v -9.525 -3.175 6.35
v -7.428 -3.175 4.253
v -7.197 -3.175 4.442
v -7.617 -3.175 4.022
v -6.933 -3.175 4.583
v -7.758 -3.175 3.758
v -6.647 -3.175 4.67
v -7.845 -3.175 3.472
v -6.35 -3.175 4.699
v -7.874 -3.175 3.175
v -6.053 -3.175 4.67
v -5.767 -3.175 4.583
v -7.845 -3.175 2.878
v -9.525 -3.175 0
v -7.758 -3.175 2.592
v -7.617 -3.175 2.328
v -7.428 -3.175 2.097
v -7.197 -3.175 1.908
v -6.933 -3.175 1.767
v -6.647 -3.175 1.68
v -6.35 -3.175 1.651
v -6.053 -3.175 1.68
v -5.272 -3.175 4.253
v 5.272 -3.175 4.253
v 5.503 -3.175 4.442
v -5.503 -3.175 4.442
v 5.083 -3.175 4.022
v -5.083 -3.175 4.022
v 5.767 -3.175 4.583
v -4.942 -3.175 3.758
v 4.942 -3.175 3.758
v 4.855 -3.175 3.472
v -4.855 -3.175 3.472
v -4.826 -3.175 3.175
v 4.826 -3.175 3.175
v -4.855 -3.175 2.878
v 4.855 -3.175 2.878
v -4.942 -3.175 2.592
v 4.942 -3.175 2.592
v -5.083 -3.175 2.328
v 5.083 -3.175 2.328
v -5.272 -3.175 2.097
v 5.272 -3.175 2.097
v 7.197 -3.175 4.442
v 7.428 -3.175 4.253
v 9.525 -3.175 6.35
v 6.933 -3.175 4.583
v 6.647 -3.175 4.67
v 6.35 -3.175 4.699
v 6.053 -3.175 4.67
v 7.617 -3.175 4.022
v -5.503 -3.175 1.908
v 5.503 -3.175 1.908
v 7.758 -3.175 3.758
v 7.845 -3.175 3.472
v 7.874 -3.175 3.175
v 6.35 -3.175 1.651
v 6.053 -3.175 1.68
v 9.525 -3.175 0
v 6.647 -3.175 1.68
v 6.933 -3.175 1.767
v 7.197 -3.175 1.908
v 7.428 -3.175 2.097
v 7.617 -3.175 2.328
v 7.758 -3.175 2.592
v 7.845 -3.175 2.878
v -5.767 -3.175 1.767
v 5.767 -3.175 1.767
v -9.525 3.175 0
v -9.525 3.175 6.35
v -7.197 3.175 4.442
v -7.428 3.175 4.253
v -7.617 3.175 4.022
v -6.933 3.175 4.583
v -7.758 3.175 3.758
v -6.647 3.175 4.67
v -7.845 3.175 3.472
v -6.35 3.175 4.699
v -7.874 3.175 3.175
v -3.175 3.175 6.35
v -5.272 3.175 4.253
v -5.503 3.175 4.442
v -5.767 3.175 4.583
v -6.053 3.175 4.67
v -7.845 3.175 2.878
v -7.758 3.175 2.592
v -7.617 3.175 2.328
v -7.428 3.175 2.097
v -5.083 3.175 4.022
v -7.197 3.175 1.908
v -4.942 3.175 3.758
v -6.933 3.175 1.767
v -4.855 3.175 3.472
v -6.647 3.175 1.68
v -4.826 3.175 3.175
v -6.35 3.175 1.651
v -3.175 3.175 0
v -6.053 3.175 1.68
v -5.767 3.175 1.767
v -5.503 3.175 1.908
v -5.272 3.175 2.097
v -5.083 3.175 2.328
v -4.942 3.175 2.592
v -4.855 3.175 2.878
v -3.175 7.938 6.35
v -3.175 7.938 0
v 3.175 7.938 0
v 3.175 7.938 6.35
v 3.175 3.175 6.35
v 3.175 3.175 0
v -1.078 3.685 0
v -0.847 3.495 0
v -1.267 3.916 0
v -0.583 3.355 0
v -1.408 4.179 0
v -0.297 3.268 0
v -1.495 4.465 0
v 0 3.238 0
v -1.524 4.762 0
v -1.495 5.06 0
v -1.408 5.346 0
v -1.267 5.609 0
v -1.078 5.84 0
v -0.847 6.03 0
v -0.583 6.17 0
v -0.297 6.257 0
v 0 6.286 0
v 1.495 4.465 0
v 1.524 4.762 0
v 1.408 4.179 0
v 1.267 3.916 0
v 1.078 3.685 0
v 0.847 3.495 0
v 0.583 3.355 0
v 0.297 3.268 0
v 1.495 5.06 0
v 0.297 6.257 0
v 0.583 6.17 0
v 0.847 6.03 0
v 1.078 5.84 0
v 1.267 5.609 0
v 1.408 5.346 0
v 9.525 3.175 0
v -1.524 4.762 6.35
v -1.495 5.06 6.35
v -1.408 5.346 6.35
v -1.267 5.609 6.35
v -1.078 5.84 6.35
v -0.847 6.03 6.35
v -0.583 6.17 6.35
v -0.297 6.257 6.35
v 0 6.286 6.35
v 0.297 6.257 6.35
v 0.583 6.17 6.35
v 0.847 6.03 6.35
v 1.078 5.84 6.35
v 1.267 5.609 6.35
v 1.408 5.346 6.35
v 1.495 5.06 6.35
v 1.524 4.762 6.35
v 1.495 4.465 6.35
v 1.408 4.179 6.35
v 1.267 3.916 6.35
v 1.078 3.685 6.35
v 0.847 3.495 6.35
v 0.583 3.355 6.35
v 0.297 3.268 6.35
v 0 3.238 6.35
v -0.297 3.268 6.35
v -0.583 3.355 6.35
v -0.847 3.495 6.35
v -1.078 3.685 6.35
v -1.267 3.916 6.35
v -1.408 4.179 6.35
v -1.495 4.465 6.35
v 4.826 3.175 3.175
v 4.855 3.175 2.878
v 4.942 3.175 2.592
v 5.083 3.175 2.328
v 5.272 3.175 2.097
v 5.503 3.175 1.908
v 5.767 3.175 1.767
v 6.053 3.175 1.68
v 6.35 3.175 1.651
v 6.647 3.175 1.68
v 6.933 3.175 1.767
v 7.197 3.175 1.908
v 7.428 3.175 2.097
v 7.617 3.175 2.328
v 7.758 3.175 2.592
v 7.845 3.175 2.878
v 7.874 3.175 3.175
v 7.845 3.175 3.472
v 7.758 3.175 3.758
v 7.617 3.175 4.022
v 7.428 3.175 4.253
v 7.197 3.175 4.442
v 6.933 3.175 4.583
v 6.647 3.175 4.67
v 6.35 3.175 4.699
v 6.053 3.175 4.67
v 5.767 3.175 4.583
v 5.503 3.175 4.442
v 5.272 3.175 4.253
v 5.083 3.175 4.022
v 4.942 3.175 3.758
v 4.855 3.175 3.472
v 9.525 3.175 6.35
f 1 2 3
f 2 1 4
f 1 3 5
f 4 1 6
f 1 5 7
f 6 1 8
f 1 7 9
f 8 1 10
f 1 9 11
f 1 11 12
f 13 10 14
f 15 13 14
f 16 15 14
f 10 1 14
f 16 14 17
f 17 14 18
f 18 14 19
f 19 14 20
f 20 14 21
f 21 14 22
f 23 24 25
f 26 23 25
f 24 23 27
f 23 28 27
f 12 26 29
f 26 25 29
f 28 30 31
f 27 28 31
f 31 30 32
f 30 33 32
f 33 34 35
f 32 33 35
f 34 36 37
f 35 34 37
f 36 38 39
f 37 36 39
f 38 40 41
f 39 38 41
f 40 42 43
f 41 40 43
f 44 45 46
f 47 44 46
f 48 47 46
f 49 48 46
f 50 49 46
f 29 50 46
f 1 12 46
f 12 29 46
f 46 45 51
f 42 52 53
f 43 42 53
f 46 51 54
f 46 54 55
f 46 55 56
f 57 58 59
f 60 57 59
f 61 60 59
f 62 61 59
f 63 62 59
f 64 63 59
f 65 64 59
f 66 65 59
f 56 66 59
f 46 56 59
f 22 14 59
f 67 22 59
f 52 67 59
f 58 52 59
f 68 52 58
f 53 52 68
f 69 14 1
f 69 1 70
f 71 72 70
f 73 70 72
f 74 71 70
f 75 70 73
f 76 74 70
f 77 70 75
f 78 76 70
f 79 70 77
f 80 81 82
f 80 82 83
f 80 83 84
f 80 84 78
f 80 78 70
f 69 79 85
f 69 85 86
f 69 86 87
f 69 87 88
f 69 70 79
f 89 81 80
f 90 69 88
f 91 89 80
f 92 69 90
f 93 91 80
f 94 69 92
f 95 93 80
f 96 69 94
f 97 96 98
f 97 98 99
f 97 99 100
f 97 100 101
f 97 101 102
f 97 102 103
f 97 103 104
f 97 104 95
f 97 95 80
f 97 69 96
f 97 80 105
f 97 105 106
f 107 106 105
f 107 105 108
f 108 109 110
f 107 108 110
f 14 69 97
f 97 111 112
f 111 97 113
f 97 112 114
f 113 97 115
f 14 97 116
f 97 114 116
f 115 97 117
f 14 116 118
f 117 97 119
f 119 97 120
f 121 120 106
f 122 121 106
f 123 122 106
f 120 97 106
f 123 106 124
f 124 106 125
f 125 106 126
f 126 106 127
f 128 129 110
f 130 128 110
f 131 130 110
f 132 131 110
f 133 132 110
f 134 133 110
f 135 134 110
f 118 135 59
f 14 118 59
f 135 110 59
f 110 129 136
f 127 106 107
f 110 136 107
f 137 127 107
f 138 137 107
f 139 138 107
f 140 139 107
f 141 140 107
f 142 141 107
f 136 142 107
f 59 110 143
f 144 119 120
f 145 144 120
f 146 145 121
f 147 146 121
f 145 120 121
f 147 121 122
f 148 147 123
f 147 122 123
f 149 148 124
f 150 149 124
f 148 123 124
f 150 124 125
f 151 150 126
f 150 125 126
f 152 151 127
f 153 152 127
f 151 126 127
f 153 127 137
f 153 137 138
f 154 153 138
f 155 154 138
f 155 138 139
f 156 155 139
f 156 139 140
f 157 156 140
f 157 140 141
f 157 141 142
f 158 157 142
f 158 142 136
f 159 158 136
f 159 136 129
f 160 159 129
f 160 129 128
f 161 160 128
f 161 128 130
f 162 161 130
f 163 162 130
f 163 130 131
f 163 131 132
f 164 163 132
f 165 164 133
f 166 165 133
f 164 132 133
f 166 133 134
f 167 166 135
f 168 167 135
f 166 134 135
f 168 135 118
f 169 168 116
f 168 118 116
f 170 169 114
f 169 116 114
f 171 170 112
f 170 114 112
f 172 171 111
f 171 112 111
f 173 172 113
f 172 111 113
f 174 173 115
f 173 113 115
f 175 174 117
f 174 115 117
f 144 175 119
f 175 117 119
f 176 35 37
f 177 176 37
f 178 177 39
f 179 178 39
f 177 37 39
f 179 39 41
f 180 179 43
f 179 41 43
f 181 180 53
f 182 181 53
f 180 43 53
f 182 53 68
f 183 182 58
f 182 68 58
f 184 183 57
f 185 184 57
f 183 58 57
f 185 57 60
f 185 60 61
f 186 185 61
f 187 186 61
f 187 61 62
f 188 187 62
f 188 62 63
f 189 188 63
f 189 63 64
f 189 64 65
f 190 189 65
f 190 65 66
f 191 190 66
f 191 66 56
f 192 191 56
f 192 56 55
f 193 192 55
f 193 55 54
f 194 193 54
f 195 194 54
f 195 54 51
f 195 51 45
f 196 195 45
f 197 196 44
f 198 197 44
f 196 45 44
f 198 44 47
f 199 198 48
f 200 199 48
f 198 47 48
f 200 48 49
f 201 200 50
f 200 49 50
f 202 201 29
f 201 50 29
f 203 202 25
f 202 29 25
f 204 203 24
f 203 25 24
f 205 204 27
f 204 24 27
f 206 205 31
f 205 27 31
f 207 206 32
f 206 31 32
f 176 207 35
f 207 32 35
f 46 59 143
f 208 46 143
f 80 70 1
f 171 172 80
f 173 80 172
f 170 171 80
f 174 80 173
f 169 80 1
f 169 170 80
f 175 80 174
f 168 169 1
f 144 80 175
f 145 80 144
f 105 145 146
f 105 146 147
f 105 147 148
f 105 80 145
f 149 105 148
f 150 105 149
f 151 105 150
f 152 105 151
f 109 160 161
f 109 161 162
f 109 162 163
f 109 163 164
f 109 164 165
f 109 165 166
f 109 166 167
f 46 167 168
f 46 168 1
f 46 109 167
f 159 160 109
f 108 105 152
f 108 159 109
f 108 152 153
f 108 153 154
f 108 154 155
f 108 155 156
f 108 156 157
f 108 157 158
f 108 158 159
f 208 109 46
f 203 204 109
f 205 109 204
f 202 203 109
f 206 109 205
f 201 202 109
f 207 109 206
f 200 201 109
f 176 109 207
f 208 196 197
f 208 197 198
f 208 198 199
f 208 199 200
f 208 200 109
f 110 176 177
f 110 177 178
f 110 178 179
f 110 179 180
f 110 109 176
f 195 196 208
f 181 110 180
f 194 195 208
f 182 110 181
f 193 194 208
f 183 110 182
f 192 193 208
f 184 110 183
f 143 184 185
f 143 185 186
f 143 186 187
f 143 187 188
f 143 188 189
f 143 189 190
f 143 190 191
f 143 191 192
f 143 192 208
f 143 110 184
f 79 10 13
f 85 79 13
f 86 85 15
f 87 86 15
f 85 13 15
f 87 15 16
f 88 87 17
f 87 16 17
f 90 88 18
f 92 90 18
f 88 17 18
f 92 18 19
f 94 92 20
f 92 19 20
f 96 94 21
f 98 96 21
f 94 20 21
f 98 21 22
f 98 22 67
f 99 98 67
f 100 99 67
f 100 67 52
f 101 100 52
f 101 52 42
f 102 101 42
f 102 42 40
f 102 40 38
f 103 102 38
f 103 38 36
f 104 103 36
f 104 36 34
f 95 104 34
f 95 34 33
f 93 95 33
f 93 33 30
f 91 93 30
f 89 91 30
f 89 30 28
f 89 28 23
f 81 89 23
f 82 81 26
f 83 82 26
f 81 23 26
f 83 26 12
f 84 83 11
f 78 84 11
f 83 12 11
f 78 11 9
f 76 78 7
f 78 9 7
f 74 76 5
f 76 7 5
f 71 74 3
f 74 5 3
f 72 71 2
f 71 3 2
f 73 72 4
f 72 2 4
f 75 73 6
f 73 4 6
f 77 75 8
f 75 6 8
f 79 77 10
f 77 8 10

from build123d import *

# Parameters (mm, degrees)
SKETCH1_W                        = 19.05
SKETCH1_H                        = 6.35
BOSS_EXTRUDE1_DEPTH              = 6.35
SKETCH6_W                        = 6.35
SKETCH6_H                        = 6.35
BOSS_EXTRUDE2_DEPTH              = 4.7625
TAPPED_HOLE_FOR_4_40_HELICOIL1_D = 3.048
TAPPED_HOLE_FOR_4_40_HELICOIL2_D = 3.048


with BuildPart() as part:
    # Sketch1 → Boss-Extrude1 (new body)
    with BuildSketch(Plane.XY):
        Rectangle(SKETCH1_W, SKETCH1_H)
    extrude(amount=BOSS_EXTRUDE1_DEPTH)

    # Sketch6 → Boss-Extrude2 (add)
    with BuildSketch(Plane(origin=(0, 3.175, 0), x_dir=(1, 0, 0), z_dir=(0, 1, 0))):
        with Locations((0, -3.175)):
            Rectangle(SKETCH6_W, SKETCH6_H)
    extrude(amount=BOSS_EXTRUDE2_DEPTH)

    # Tapped Hole for #4-40 Helicoil1 (through all)
    with Locations(Plane(origin=(0, 3.175, 0), x_dir=(1, 0, 0), z_dir=(0, 1, 0))):
        with Locations((-6.35, -3.175), (6.35, -3.175)):
            Hole(TAPPED_HOLE_FOR_4_40_HELICOIL1_D / 2)

    # Tapped Hole for #4-40 Helicoil2 (through all)
    with Locations(Plane.XY.offset(6.35)):
        with Locations((0, 4.7625)):
            Hole(TAPPED_HOLE_FOR_4_40_HELICOIL2_D / 2)


solid = part.part
